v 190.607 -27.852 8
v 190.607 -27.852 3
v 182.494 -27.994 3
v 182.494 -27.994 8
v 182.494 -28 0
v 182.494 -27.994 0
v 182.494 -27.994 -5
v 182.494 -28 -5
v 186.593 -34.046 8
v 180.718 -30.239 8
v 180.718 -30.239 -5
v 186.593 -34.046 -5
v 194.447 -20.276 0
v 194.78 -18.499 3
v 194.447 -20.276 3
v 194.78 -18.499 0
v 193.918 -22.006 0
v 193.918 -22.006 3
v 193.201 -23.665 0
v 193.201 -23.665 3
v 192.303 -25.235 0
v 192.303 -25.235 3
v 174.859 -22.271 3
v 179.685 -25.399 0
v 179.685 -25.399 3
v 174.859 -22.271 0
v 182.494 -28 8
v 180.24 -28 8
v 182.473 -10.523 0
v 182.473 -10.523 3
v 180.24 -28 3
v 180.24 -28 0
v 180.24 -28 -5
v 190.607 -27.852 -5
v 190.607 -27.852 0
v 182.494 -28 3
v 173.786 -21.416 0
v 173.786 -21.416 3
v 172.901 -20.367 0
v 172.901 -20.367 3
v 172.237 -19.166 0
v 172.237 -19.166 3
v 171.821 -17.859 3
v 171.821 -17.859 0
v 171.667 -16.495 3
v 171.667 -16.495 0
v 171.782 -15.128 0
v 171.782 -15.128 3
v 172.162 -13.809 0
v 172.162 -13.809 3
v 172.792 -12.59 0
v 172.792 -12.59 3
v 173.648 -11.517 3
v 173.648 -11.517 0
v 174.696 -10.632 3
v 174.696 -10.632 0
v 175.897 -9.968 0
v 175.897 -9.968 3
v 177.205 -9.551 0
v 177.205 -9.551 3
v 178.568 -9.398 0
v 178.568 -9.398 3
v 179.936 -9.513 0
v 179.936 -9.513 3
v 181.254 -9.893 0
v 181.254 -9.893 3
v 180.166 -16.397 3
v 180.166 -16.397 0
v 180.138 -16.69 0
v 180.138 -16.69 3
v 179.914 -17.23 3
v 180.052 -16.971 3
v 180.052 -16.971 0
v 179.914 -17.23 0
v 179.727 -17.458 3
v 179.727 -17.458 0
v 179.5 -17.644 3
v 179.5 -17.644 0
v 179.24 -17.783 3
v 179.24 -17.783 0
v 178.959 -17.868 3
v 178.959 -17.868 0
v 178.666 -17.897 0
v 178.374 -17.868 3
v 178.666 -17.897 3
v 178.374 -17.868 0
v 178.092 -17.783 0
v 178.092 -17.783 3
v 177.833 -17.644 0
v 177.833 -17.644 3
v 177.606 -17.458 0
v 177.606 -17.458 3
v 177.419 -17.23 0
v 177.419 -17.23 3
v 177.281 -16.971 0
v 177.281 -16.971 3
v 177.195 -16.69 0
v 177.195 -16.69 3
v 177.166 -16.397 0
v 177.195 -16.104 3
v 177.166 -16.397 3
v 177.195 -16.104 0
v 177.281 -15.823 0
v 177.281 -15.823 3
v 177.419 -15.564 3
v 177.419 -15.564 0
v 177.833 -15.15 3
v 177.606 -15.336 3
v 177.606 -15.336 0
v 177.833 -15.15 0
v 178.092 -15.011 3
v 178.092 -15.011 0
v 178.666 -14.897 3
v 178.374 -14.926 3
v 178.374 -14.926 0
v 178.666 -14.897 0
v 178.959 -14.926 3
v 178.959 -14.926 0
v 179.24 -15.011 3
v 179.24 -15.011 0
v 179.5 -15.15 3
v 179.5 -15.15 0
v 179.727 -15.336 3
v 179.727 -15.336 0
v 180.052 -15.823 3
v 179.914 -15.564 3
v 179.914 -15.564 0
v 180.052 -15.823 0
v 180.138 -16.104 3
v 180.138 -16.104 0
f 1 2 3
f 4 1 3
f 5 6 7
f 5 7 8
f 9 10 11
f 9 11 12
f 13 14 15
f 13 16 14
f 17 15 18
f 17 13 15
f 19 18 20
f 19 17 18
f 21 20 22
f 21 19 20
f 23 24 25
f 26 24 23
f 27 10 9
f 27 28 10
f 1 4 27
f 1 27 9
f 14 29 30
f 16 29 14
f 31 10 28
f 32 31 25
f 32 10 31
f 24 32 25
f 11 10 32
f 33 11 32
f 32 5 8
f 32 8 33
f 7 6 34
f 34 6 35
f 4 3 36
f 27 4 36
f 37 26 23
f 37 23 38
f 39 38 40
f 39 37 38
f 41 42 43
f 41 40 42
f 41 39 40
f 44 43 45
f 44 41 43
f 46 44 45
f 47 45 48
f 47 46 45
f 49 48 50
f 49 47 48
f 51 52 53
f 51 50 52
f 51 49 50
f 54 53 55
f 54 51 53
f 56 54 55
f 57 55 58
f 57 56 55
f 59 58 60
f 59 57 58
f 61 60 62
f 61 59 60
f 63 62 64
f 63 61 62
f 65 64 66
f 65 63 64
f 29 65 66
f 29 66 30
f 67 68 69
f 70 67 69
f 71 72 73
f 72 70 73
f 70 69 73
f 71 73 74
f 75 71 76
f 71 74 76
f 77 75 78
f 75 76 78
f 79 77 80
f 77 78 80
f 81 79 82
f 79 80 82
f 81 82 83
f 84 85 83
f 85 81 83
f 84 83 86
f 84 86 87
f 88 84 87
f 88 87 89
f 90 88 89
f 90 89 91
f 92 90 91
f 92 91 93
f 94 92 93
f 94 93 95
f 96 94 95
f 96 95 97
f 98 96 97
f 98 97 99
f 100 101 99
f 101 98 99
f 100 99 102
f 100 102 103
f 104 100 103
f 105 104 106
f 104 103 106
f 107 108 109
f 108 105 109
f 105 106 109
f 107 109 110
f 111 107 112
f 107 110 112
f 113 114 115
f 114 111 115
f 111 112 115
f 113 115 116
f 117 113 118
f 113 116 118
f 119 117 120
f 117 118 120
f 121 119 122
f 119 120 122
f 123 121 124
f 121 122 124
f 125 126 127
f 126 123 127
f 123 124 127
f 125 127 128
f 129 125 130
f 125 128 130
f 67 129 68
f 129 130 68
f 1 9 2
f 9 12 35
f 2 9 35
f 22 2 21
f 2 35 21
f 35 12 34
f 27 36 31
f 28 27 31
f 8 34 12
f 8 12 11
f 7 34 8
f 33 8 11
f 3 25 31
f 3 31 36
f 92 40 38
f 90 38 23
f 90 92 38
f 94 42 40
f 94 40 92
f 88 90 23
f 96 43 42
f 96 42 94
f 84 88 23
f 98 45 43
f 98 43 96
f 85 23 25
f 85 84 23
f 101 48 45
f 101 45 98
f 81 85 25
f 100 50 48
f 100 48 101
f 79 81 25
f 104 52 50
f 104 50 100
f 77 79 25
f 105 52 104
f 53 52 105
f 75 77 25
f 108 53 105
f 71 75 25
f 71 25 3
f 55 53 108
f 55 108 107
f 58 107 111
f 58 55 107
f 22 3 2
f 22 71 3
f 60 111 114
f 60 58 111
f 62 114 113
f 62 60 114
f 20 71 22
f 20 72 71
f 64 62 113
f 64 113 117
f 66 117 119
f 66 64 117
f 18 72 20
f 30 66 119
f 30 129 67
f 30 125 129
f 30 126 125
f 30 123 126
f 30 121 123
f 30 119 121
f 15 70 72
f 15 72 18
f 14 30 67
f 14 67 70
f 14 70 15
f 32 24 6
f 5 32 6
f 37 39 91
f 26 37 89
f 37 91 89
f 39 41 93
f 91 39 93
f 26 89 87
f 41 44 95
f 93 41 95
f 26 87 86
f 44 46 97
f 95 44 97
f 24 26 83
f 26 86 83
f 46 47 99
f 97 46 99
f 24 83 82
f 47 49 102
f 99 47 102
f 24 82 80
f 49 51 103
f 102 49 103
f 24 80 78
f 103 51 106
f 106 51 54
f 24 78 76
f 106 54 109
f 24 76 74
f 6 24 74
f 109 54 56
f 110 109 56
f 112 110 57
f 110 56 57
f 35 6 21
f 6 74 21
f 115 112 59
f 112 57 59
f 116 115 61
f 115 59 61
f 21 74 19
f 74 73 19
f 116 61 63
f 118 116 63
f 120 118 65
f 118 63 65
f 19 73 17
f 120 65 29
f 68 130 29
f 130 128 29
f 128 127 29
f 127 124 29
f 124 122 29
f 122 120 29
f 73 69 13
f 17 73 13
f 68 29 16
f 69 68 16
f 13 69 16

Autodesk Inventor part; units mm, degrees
ref_plane "YZ Plane" through (0, 0, 0) normal (1, 0, 0) x (0, 1, 0)
ref_plane "XZ Plane" through (0, 0, 0) normal (0, 1, 0) x (-1, 0, 0)
ref_plane "Work Plane1" through (0, 0, 0) normal (0, 0, 1) x (1, 0, 0)
sketch "Sketch1" plane through (0, 0, 0) normal (0, 0, 1) x (1, 0, 0)
  circle A0 centre (178.666376, -16.397041) radius 1.5
  line L0 (201.424818, -12.080439) -> (122.055329, -134.544275)
  line L1 (192.303309, -25.235213) -> (190.399763, -28.172305)
  arc A1 (180.569922, -13.459949) -> (176.76283, -19.334134) centre (178.666376, -16.397041) ccw
  line L2 (182.927065, -27.5) -> (174.859284, -22.271227)
  arc A2 (182.473468, -10.522856) -> (174.859284, -22.271227) centre (178.666376, -16.397041) ccw
  line L3 (226.007006, -27.5) -> (182.061376, -27.5)
  line L4 (203.888132, -20.231027) -> (184.377014, -7.585764)
  line L5 (182.473468, -10.522856) -> (194.780372, -18.499029)
  line L6 (180.718486, -30.239399) -> (187.012256, -34.318426)
  arc A3 (192.303309, -25.235213) -> (194.780372, -18.499029) centre (178.666376, -16.397041) ccw
  line L7 (182.622032, -27.302306) -> (180.718486, -30.239399)
  line L8 (192.303309, -25.235213) -> (186.592671, -34.046491)
  point P0 (0, 0)
  point P1 (182.493905, -27.5)
  dimension "d0" = 0.5
  dimension "d1" = 7
extrude "Extrusion1" add sketch "Sketch1" along normal blind 3 contours L3 L2 A2 L5 A3 L1 | L1 L8 L6 L7 L3 | L3 L7 L2
sketch "Sketch2" plane through (0, 0, 0) normal (0, 0, -1) x (-1, 0, 0)
  line L0 (-113.222122, -27.5) -> (-151.8, -27.5)
  line L1 (-182.622032, -27.302306) -> (-180.718486, -30.239399)
  line L2 (-180.718486, -30.239399) -> (-186.592671, -34.046491)
  line L3 (-121.635744, -134.27234) -> (-201.005233, -11.808504)
  line L4 (-182.493905, -27.5) -> (-182.493905, -28)
  line L5 (-182.493905, -28) -> (-182.265706, -27.852103)
  line L6 (-182.622032, -27.302306) -> (-180.718486, -30.239399)
  line L7 (-182.493905, -28) -> (-182.169853, -28)
  line L8 (-182.169853, -28) -> (-190.607288, -27.852103)
  point P0 (0, 0)
  point P1 (-182.493905, -27.99432)
  dimension "d10" = 0.5
ref_plane "Work Plane2" through (162.2, -27.5, -5) normal (0, 0, -1) x (0, 1, 0)
extrude "Extrusion2" add sketch "Sketch2" along normal up to surface (5 mm away) contours L4 L7 L1 L2 L3 L8
sketch "Sketch3" plane through (0, 0, 3) normal (0, 0, 1) x (1, 0, 0)
  line L0 (190.607288, -27.852103) -> (182.493905, -27.99432)
  line L1 (186.592671, -34.046491) -> (190.607288, -27.852103)
  line L2 (180.718486, -30.239399) -> (186.592671, -34.046491)
  line L3 (182.169853, -28) -> (180.718486, -30.239399)
  line L4 (182.493905, -28) -> (182.169853, -28)
  line L5 (182.493905, -27.99432) -> (182.493905, -28)
  point P0 (0, 0)
extrude "Extrusion3" add sketch "Sketch3" along normal blind 5
chamfer "Chamfer1" distance 3.5 angle 45 1 edges at (182.622, -27.3023, 1.5)
properties part number "Lock1_3DPrint"
